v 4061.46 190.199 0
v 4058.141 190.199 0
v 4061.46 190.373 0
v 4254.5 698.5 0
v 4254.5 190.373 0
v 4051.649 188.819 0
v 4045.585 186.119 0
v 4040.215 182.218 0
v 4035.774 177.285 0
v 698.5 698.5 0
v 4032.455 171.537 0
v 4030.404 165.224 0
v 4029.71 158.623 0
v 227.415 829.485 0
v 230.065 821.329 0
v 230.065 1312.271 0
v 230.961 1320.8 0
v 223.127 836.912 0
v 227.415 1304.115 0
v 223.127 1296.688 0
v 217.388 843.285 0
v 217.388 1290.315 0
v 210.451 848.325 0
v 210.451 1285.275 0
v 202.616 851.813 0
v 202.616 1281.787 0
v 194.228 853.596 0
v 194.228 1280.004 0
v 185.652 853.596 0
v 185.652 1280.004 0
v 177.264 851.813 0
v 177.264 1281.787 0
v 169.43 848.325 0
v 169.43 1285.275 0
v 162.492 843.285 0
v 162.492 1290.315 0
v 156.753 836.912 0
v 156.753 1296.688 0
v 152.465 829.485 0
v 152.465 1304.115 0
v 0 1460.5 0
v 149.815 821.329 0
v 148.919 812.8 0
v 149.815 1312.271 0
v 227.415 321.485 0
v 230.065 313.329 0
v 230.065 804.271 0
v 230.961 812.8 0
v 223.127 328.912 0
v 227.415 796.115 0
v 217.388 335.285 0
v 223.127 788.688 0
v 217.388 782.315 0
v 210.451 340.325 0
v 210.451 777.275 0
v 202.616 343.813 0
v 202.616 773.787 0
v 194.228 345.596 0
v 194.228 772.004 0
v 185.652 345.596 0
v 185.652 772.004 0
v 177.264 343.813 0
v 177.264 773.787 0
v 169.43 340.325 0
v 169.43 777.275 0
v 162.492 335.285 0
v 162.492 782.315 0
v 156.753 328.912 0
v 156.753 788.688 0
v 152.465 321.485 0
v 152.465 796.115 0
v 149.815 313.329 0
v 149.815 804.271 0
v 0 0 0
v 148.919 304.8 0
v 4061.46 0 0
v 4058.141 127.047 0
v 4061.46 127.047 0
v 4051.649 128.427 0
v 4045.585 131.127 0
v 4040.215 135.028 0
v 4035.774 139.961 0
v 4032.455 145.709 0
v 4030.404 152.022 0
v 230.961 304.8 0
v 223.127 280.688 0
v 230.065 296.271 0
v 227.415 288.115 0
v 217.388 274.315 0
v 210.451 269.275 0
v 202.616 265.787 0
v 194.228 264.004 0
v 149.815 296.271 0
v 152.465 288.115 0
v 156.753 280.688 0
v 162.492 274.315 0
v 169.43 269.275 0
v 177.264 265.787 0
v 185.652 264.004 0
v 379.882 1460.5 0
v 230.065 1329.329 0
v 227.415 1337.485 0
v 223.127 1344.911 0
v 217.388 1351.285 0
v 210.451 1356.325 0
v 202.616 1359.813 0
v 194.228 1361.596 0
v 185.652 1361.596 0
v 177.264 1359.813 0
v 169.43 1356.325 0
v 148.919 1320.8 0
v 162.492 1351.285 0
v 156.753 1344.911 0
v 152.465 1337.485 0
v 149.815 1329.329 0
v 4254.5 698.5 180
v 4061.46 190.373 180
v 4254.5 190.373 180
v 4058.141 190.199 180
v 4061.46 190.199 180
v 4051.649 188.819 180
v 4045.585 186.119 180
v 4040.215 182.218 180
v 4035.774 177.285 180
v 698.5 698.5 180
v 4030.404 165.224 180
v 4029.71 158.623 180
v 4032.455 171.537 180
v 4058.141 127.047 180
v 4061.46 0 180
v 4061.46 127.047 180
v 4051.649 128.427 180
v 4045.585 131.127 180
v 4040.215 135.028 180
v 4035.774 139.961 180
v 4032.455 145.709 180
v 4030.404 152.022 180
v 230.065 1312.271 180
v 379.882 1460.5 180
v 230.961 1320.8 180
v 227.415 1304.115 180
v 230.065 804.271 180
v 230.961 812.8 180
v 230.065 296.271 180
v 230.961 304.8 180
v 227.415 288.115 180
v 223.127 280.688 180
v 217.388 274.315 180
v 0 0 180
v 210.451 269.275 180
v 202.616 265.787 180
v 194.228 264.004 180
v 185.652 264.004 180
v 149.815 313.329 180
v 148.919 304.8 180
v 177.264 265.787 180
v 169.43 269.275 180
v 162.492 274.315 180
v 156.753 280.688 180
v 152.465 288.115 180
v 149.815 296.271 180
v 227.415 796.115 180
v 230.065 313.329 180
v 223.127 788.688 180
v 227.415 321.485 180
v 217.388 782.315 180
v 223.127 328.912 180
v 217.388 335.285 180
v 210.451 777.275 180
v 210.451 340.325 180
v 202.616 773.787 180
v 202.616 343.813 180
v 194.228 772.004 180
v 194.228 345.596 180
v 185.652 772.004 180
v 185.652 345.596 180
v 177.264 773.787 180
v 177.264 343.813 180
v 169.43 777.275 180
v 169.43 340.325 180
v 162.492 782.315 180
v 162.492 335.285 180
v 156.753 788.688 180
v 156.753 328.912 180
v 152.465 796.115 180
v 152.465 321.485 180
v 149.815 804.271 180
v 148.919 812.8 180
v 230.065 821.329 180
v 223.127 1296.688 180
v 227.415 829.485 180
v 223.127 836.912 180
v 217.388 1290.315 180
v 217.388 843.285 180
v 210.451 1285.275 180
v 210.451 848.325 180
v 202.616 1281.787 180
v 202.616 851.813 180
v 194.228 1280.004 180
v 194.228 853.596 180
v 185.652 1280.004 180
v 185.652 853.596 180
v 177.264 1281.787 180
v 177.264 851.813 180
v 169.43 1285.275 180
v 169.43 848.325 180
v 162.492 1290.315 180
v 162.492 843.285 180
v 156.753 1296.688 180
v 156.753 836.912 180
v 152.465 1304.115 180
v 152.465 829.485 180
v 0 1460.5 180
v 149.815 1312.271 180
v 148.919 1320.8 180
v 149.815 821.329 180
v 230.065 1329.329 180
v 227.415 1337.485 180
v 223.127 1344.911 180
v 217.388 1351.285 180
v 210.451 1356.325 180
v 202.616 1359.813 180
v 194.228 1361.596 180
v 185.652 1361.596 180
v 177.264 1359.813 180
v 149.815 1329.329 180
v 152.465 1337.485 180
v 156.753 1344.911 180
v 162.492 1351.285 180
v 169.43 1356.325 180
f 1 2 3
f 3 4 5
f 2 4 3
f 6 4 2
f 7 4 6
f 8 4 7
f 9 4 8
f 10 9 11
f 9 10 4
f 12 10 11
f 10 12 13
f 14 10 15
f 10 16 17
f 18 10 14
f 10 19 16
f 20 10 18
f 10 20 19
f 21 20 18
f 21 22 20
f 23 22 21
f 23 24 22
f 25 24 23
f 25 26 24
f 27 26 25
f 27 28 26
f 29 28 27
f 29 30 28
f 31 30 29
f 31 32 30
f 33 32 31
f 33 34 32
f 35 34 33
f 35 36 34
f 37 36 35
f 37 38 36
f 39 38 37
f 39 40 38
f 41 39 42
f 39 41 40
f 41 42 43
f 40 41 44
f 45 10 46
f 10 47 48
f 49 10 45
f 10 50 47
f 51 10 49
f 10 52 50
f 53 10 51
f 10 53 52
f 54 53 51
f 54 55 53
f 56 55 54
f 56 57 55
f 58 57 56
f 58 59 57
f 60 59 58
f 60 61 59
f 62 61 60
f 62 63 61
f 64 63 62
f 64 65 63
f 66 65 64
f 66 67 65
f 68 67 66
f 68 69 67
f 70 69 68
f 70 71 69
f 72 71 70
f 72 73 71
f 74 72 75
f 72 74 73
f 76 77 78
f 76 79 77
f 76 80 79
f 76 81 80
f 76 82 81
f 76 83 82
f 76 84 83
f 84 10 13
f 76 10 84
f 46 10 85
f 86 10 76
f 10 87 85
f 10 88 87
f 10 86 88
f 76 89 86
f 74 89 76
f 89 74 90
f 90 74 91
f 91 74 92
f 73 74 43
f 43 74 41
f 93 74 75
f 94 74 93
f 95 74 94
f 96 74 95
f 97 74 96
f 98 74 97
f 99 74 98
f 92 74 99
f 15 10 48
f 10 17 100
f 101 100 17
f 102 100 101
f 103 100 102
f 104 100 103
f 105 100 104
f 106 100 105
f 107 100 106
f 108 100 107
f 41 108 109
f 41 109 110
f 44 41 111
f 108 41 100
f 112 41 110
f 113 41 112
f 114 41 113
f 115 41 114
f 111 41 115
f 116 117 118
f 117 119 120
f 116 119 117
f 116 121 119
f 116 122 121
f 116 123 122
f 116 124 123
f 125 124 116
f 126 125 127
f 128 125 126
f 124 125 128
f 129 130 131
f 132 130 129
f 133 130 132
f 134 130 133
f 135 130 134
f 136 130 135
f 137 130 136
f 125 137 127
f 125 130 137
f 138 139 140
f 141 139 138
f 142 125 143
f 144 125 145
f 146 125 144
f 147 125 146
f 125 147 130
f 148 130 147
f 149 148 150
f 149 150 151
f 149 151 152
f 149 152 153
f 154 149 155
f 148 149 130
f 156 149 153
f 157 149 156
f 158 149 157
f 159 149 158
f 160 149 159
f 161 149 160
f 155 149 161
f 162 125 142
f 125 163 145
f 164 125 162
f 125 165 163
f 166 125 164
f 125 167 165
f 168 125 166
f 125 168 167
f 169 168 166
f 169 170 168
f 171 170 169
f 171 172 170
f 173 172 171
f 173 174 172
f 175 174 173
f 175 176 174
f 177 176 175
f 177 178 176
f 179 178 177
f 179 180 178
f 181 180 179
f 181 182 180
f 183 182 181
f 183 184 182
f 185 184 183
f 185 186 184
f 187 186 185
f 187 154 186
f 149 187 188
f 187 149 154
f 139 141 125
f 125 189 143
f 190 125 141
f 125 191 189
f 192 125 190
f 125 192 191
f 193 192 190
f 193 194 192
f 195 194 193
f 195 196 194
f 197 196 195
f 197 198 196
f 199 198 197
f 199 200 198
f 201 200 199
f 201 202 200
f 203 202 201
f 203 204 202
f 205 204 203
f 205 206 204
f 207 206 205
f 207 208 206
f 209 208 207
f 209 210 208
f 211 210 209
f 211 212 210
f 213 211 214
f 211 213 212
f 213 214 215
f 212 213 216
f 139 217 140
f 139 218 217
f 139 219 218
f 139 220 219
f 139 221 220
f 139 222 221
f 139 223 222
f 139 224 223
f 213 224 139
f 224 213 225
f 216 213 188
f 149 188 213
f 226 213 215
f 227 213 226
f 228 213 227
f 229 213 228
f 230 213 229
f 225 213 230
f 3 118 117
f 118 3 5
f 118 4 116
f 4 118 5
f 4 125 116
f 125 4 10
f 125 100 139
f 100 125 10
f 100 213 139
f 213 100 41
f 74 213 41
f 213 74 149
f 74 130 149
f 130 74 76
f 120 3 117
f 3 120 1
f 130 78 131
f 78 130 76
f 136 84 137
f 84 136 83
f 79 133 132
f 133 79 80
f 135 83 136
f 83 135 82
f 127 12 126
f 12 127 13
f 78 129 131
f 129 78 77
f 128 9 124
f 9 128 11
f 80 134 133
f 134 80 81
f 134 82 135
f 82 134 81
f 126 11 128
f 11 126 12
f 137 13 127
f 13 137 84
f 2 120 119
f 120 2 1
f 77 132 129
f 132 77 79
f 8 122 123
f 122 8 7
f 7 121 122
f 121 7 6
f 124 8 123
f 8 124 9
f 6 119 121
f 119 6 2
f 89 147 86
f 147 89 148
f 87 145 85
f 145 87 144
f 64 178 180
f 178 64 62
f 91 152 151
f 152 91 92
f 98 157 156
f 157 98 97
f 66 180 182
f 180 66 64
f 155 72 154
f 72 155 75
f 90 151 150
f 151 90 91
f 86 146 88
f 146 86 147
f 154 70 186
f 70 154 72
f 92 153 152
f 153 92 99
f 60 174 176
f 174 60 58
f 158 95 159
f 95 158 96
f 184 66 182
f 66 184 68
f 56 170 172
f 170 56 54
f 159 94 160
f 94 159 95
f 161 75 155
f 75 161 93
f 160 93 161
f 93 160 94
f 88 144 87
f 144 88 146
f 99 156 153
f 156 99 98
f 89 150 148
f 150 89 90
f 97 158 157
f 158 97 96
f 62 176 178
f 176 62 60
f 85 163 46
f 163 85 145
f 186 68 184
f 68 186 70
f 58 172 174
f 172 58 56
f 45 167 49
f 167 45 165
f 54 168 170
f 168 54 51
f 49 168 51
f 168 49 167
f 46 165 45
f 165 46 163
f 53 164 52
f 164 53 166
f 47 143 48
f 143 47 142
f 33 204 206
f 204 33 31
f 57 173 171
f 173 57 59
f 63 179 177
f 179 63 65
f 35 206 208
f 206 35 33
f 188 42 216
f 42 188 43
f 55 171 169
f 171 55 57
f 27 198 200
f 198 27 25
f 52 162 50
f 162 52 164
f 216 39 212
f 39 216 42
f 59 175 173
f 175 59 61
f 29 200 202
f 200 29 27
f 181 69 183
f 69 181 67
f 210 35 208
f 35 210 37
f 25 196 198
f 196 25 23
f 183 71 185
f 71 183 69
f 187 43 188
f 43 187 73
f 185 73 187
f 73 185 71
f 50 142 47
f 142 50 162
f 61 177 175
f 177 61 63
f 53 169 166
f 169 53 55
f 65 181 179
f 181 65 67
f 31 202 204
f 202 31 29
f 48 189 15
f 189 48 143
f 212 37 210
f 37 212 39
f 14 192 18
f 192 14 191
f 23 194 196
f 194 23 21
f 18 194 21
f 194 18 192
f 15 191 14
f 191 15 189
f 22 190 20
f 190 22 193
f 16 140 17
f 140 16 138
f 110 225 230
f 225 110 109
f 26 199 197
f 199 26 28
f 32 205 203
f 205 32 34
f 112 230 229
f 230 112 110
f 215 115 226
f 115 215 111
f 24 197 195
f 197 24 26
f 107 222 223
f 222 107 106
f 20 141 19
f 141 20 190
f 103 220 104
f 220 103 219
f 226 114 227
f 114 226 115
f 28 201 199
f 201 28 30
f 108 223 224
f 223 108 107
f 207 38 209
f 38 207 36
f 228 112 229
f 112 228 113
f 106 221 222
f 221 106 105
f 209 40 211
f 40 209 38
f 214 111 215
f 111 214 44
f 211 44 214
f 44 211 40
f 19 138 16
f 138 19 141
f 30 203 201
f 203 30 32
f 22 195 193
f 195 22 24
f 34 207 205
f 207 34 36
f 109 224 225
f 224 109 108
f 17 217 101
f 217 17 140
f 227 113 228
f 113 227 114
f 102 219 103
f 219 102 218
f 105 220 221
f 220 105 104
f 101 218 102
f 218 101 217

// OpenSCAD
// file: global_constants.scad
// unit = 0.1 mm
// 1 inch = 25.4 mm = 254 units

// Dimensions

// Sheet dimensions
sheet_x=24400;
sheet_y=12200;
sheet_z=180;

// Circular cnc routing holes
cnc_circle_r=31.750;
module routing_circle(x,y){
  translate([x,y]) linear_extrude(height=sheet_z) circle(cnc_circle_r);
}

bolt_circle_r=41.0210;
module bolt_circle(x,y){
  translate([x,y]) linear_extrude(height=sheet_z) circle(bolt_circle_r);
}

//Conversion
medievaltometric=254;
metrictomedieval=.0039370078;

// Use the metric system by default
// units="medieval";
units="metric";

// Light plate construction
light_plate_support_height=1651;//6.5"
light_plate_support_width=3662.68;//14.42
// main file
// To render the DXF file from the command line:
// openscad -x small_support.dxf -D'units="metric"' small_support.scad

include <global_constants.scad>;

x1=379.8824;
x2=698.5;
x3=4061.46;
x4=4254.5;
y1=190.3730;
y2=698.5;
y3=1460.5;
bolt_circle_middle_x=189.94;

render (convexity = 10){
    difference(){
    linear_extrude(height=sheet_z) polygon([[0,0],[x3,0],[x3,y1],[x4,y1],[x4,y2],[x2,y2],[x1,y3],[0,y3],[0,0]]);
    routing_circle(x3,y1-cnc_circle_r);
    bolt_circle(bolt_circle_middle_x,304.8);
    bolt_circle(bolt_circle_middle_x,812.8);
    bolt_circle(bolt_circle_middle_x,1320.8);
  }
}
